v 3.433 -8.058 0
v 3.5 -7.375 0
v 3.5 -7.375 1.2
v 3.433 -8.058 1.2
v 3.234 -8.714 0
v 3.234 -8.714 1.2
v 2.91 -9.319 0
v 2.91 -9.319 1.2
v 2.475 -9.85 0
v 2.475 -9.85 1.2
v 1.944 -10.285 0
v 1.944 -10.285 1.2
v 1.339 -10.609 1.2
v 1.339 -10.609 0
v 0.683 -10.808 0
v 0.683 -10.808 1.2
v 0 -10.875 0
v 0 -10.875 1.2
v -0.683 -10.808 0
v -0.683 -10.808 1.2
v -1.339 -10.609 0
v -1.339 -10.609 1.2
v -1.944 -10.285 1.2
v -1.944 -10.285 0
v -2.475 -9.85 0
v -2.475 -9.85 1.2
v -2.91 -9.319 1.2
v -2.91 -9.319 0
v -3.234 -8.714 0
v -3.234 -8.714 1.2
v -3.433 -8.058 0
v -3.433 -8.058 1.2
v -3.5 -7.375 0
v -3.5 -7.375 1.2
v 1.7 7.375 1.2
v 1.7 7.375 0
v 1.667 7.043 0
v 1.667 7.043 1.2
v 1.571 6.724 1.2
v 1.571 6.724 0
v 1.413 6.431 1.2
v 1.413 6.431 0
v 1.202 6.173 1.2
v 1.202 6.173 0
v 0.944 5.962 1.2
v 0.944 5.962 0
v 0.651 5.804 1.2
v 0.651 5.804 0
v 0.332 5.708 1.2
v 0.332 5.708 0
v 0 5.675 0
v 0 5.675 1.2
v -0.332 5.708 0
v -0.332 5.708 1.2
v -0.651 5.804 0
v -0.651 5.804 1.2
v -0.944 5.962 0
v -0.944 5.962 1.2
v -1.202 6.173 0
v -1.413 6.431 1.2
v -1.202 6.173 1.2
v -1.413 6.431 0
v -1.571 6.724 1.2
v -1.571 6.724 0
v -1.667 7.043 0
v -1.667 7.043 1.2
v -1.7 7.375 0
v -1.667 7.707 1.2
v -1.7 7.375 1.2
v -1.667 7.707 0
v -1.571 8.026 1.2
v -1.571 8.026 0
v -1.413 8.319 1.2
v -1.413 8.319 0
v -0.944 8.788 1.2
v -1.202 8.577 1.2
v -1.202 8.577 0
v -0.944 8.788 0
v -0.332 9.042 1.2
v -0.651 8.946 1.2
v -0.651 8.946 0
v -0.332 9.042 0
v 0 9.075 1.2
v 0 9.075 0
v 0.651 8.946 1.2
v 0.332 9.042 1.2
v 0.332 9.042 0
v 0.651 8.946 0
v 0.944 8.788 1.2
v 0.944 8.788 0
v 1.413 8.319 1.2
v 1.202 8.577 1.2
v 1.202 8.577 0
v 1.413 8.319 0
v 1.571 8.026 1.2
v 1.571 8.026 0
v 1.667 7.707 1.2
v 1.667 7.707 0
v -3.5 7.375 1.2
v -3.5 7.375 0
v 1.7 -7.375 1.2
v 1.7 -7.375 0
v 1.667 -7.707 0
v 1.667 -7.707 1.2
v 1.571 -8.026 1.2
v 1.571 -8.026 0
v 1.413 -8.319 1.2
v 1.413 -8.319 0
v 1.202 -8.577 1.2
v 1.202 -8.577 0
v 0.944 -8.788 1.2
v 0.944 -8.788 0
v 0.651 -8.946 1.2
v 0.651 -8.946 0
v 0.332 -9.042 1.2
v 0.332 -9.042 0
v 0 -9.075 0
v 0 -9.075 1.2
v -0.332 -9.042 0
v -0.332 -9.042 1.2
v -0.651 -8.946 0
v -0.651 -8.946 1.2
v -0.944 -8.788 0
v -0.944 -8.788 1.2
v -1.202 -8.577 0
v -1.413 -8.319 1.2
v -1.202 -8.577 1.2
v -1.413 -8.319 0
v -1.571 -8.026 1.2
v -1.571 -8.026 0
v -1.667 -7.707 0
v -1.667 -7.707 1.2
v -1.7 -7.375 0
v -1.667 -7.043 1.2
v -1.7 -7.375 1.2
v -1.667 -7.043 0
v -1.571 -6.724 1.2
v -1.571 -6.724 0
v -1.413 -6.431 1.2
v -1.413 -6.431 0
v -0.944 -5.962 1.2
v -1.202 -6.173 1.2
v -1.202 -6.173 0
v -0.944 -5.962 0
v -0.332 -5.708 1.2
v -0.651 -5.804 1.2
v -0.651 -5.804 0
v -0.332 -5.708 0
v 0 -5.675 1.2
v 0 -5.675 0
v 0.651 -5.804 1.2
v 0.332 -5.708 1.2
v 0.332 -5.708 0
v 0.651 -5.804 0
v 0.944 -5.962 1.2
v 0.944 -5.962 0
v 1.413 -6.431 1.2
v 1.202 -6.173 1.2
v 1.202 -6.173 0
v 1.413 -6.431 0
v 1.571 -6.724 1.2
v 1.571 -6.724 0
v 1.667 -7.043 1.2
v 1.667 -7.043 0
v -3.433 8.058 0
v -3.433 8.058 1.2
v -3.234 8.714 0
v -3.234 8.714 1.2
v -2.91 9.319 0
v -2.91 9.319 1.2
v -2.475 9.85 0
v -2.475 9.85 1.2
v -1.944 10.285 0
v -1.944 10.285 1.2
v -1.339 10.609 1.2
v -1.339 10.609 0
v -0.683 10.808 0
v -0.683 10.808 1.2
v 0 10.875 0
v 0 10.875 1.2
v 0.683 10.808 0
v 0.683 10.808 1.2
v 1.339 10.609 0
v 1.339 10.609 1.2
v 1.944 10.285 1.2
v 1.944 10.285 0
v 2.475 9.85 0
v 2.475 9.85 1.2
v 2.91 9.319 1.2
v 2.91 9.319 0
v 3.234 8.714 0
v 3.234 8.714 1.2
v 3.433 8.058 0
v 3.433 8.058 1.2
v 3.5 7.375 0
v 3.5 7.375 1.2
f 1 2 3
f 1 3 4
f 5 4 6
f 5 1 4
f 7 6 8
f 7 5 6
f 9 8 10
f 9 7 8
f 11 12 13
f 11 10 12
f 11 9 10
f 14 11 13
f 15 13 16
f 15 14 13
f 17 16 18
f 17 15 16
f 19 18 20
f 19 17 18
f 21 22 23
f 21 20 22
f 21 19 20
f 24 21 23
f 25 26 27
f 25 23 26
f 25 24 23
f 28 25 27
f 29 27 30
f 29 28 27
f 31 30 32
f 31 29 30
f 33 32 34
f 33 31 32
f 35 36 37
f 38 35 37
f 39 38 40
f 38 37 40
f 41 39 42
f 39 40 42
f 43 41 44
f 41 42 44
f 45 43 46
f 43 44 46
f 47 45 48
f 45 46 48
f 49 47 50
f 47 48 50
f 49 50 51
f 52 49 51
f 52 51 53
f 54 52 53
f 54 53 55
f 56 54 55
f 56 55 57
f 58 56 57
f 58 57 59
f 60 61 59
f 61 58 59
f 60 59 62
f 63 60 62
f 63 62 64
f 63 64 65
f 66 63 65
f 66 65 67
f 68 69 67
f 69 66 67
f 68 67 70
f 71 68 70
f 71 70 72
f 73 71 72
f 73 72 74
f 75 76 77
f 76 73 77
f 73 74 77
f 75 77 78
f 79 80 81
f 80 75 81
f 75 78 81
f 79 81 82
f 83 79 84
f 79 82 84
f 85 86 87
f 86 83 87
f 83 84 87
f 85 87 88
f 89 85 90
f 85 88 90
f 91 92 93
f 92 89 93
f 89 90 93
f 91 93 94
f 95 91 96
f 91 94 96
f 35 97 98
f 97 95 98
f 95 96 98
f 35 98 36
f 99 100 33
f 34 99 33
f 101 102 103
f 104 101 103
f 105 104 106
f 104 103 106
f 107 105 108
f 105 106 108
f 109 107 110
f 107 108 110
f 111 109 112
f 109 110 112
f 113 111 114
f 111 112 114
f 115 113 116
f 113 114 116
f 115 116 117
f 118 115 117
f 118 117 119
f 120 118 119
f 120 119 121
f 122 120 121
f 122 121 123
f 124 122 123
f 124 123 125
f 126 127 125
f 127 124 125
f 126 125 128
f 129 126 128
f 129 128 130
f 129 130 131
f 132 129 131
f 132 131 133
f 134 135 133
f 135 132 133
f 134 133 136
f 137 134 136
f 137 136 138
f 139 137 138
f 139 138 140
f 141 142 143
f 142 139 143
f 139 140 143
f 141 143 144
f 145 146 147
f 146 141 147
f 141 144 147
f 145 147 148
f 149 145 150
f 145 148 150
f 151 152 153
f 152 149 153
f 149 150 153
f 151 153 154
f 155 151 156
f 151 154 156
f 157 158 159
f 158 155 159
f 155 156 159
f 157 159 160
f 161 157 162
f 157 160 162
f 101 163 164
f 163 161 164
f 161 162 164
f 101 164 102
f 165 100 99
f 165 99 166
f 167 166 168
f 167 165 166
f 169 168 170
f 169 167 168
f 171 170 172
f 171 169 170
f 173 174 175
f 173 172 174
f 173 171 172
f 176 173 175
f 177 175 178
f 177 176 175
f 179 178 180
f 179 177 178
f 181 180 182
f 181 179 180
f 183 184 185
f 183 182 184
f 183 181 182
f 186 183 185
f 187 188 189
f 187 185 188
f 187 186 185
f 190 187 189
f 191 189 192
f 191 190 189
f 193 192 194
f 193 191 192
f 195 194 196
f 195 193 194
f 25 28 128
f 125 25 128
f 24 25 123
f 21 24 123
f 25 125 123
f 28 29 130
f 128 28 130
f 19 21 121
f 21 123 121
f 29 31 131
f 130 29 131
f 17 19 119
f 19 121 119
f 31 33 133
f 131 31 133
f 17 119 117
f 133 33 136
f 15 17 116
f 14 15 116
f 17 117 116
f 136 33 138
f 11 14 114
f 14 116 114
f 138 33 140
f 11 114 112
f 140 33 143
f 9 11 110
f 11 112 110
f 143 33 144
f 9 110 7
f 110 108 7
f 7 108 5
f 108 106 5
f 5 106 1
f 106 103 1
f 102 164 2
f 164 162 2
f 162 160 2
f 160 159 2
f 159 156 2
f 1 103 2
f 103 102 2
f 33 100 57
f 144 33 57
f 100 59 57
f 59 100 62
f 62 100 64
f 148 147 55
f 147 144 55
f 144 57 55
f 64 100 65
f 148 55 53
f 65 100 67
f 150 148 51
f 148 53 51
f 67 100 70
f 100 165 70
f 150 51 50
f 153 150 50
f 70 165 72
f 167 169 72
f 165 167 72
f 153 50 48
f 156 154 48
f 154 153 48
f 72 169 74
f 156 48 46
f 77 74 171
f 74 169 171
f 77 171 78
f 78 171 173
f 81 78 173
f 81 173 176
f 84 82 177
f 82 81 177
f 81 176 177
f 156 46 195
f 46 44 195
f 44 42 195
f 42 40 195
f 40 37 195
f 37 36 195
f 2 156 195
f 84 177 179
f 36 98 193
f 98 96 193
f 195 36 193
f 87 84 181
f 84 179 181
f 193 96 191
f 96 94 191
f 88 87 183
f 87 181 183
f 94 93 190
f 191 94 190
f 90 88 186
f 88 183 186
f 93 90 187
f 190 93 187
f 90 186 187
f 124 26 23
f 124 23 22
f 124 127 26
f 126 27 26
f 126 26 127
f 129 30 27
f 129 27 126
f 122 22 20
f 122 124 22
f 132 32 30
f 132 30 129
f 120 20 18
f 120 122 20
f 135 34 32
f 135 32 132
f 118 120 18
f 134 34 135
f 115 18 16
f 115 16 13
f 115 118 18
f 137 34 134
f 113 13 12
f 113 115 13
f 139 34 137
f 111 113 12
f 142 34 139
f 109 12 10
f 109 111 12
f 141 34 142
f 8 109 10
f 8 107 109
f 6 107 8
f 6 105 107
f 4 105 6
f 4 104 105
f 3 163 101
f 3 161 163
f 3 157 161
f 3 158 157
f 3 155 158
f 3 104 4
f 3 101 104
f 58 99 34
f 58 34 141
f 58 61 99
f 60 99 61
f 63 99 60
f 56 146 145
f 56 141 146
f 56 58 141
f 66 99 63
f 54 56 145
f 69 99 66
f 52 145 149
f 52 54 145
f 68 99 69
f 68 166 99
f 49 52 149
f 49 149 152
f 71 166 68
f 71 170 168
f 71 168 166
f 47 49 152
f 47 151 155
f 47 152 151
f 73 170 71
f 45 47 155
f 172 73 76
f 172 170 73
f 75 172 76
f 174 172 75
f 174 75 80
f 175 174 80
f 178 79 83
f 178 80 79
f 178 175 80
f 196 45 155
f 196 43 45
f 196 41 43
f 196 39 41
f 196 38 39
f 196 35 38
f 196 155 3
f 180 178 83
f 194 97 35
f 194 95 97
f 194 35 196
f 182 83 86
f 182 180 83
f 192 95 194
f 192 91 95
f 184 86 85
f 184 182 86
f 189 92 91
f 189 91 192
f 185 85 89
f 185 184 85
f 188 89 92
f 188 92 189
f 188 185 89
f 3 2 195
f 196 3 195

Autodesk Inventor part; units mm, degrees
ref_plane "YZ Plane" through (0, 0, 0) normal (1, 0, 0) x (0, 1, 0)
ref_plane "XZ Plane" through (0, 0, 0) normal (0, 1, 0) x (-1, 0, 0)
ref_plane "XY Plane" through (0, 0, 0) normal (0, 0, 1) x (1, 0, 0)
sketch "Náčrt1" plane through (0, 0, 0) normal (0, 0, 1) x (1, 0, 0)
  line L0 (0, 7.375) -> (0, -7.375) construction
  line L1 (-3.5, 7.375) -> (-3.5, -7.375)
  line L2 (3.5, -7.375) -> (3.5, 7.375)
  arc A0 (3.5, 7.375) -> (-3.5, 7.375) centre (0, 7.375) ccw
  arc A1 (-3.5, -7.375) -> (3.5, -7.375) centre (0, -7.375) ccw
  circle A2 centre (0, 7.375) radius 1.7
  circle A3 centre (0, -7.375) radius 1.7
  circle A4 centre (0, 7.375) radius 3.5
  point P0 (0, 0)
  point P1 (0, 0)
  point P2 (-3.5, 7.375)
  point P3 (3.5, 7.375)
  dimension "d0" = 14.75
  dimension "d1" = 3.5
  dimension "d2" = 3.4
extrude "Vysunutí1" add sketch "Náčrt1" along normal blind 1.2
properties part number "not flex back qre flex holder"
